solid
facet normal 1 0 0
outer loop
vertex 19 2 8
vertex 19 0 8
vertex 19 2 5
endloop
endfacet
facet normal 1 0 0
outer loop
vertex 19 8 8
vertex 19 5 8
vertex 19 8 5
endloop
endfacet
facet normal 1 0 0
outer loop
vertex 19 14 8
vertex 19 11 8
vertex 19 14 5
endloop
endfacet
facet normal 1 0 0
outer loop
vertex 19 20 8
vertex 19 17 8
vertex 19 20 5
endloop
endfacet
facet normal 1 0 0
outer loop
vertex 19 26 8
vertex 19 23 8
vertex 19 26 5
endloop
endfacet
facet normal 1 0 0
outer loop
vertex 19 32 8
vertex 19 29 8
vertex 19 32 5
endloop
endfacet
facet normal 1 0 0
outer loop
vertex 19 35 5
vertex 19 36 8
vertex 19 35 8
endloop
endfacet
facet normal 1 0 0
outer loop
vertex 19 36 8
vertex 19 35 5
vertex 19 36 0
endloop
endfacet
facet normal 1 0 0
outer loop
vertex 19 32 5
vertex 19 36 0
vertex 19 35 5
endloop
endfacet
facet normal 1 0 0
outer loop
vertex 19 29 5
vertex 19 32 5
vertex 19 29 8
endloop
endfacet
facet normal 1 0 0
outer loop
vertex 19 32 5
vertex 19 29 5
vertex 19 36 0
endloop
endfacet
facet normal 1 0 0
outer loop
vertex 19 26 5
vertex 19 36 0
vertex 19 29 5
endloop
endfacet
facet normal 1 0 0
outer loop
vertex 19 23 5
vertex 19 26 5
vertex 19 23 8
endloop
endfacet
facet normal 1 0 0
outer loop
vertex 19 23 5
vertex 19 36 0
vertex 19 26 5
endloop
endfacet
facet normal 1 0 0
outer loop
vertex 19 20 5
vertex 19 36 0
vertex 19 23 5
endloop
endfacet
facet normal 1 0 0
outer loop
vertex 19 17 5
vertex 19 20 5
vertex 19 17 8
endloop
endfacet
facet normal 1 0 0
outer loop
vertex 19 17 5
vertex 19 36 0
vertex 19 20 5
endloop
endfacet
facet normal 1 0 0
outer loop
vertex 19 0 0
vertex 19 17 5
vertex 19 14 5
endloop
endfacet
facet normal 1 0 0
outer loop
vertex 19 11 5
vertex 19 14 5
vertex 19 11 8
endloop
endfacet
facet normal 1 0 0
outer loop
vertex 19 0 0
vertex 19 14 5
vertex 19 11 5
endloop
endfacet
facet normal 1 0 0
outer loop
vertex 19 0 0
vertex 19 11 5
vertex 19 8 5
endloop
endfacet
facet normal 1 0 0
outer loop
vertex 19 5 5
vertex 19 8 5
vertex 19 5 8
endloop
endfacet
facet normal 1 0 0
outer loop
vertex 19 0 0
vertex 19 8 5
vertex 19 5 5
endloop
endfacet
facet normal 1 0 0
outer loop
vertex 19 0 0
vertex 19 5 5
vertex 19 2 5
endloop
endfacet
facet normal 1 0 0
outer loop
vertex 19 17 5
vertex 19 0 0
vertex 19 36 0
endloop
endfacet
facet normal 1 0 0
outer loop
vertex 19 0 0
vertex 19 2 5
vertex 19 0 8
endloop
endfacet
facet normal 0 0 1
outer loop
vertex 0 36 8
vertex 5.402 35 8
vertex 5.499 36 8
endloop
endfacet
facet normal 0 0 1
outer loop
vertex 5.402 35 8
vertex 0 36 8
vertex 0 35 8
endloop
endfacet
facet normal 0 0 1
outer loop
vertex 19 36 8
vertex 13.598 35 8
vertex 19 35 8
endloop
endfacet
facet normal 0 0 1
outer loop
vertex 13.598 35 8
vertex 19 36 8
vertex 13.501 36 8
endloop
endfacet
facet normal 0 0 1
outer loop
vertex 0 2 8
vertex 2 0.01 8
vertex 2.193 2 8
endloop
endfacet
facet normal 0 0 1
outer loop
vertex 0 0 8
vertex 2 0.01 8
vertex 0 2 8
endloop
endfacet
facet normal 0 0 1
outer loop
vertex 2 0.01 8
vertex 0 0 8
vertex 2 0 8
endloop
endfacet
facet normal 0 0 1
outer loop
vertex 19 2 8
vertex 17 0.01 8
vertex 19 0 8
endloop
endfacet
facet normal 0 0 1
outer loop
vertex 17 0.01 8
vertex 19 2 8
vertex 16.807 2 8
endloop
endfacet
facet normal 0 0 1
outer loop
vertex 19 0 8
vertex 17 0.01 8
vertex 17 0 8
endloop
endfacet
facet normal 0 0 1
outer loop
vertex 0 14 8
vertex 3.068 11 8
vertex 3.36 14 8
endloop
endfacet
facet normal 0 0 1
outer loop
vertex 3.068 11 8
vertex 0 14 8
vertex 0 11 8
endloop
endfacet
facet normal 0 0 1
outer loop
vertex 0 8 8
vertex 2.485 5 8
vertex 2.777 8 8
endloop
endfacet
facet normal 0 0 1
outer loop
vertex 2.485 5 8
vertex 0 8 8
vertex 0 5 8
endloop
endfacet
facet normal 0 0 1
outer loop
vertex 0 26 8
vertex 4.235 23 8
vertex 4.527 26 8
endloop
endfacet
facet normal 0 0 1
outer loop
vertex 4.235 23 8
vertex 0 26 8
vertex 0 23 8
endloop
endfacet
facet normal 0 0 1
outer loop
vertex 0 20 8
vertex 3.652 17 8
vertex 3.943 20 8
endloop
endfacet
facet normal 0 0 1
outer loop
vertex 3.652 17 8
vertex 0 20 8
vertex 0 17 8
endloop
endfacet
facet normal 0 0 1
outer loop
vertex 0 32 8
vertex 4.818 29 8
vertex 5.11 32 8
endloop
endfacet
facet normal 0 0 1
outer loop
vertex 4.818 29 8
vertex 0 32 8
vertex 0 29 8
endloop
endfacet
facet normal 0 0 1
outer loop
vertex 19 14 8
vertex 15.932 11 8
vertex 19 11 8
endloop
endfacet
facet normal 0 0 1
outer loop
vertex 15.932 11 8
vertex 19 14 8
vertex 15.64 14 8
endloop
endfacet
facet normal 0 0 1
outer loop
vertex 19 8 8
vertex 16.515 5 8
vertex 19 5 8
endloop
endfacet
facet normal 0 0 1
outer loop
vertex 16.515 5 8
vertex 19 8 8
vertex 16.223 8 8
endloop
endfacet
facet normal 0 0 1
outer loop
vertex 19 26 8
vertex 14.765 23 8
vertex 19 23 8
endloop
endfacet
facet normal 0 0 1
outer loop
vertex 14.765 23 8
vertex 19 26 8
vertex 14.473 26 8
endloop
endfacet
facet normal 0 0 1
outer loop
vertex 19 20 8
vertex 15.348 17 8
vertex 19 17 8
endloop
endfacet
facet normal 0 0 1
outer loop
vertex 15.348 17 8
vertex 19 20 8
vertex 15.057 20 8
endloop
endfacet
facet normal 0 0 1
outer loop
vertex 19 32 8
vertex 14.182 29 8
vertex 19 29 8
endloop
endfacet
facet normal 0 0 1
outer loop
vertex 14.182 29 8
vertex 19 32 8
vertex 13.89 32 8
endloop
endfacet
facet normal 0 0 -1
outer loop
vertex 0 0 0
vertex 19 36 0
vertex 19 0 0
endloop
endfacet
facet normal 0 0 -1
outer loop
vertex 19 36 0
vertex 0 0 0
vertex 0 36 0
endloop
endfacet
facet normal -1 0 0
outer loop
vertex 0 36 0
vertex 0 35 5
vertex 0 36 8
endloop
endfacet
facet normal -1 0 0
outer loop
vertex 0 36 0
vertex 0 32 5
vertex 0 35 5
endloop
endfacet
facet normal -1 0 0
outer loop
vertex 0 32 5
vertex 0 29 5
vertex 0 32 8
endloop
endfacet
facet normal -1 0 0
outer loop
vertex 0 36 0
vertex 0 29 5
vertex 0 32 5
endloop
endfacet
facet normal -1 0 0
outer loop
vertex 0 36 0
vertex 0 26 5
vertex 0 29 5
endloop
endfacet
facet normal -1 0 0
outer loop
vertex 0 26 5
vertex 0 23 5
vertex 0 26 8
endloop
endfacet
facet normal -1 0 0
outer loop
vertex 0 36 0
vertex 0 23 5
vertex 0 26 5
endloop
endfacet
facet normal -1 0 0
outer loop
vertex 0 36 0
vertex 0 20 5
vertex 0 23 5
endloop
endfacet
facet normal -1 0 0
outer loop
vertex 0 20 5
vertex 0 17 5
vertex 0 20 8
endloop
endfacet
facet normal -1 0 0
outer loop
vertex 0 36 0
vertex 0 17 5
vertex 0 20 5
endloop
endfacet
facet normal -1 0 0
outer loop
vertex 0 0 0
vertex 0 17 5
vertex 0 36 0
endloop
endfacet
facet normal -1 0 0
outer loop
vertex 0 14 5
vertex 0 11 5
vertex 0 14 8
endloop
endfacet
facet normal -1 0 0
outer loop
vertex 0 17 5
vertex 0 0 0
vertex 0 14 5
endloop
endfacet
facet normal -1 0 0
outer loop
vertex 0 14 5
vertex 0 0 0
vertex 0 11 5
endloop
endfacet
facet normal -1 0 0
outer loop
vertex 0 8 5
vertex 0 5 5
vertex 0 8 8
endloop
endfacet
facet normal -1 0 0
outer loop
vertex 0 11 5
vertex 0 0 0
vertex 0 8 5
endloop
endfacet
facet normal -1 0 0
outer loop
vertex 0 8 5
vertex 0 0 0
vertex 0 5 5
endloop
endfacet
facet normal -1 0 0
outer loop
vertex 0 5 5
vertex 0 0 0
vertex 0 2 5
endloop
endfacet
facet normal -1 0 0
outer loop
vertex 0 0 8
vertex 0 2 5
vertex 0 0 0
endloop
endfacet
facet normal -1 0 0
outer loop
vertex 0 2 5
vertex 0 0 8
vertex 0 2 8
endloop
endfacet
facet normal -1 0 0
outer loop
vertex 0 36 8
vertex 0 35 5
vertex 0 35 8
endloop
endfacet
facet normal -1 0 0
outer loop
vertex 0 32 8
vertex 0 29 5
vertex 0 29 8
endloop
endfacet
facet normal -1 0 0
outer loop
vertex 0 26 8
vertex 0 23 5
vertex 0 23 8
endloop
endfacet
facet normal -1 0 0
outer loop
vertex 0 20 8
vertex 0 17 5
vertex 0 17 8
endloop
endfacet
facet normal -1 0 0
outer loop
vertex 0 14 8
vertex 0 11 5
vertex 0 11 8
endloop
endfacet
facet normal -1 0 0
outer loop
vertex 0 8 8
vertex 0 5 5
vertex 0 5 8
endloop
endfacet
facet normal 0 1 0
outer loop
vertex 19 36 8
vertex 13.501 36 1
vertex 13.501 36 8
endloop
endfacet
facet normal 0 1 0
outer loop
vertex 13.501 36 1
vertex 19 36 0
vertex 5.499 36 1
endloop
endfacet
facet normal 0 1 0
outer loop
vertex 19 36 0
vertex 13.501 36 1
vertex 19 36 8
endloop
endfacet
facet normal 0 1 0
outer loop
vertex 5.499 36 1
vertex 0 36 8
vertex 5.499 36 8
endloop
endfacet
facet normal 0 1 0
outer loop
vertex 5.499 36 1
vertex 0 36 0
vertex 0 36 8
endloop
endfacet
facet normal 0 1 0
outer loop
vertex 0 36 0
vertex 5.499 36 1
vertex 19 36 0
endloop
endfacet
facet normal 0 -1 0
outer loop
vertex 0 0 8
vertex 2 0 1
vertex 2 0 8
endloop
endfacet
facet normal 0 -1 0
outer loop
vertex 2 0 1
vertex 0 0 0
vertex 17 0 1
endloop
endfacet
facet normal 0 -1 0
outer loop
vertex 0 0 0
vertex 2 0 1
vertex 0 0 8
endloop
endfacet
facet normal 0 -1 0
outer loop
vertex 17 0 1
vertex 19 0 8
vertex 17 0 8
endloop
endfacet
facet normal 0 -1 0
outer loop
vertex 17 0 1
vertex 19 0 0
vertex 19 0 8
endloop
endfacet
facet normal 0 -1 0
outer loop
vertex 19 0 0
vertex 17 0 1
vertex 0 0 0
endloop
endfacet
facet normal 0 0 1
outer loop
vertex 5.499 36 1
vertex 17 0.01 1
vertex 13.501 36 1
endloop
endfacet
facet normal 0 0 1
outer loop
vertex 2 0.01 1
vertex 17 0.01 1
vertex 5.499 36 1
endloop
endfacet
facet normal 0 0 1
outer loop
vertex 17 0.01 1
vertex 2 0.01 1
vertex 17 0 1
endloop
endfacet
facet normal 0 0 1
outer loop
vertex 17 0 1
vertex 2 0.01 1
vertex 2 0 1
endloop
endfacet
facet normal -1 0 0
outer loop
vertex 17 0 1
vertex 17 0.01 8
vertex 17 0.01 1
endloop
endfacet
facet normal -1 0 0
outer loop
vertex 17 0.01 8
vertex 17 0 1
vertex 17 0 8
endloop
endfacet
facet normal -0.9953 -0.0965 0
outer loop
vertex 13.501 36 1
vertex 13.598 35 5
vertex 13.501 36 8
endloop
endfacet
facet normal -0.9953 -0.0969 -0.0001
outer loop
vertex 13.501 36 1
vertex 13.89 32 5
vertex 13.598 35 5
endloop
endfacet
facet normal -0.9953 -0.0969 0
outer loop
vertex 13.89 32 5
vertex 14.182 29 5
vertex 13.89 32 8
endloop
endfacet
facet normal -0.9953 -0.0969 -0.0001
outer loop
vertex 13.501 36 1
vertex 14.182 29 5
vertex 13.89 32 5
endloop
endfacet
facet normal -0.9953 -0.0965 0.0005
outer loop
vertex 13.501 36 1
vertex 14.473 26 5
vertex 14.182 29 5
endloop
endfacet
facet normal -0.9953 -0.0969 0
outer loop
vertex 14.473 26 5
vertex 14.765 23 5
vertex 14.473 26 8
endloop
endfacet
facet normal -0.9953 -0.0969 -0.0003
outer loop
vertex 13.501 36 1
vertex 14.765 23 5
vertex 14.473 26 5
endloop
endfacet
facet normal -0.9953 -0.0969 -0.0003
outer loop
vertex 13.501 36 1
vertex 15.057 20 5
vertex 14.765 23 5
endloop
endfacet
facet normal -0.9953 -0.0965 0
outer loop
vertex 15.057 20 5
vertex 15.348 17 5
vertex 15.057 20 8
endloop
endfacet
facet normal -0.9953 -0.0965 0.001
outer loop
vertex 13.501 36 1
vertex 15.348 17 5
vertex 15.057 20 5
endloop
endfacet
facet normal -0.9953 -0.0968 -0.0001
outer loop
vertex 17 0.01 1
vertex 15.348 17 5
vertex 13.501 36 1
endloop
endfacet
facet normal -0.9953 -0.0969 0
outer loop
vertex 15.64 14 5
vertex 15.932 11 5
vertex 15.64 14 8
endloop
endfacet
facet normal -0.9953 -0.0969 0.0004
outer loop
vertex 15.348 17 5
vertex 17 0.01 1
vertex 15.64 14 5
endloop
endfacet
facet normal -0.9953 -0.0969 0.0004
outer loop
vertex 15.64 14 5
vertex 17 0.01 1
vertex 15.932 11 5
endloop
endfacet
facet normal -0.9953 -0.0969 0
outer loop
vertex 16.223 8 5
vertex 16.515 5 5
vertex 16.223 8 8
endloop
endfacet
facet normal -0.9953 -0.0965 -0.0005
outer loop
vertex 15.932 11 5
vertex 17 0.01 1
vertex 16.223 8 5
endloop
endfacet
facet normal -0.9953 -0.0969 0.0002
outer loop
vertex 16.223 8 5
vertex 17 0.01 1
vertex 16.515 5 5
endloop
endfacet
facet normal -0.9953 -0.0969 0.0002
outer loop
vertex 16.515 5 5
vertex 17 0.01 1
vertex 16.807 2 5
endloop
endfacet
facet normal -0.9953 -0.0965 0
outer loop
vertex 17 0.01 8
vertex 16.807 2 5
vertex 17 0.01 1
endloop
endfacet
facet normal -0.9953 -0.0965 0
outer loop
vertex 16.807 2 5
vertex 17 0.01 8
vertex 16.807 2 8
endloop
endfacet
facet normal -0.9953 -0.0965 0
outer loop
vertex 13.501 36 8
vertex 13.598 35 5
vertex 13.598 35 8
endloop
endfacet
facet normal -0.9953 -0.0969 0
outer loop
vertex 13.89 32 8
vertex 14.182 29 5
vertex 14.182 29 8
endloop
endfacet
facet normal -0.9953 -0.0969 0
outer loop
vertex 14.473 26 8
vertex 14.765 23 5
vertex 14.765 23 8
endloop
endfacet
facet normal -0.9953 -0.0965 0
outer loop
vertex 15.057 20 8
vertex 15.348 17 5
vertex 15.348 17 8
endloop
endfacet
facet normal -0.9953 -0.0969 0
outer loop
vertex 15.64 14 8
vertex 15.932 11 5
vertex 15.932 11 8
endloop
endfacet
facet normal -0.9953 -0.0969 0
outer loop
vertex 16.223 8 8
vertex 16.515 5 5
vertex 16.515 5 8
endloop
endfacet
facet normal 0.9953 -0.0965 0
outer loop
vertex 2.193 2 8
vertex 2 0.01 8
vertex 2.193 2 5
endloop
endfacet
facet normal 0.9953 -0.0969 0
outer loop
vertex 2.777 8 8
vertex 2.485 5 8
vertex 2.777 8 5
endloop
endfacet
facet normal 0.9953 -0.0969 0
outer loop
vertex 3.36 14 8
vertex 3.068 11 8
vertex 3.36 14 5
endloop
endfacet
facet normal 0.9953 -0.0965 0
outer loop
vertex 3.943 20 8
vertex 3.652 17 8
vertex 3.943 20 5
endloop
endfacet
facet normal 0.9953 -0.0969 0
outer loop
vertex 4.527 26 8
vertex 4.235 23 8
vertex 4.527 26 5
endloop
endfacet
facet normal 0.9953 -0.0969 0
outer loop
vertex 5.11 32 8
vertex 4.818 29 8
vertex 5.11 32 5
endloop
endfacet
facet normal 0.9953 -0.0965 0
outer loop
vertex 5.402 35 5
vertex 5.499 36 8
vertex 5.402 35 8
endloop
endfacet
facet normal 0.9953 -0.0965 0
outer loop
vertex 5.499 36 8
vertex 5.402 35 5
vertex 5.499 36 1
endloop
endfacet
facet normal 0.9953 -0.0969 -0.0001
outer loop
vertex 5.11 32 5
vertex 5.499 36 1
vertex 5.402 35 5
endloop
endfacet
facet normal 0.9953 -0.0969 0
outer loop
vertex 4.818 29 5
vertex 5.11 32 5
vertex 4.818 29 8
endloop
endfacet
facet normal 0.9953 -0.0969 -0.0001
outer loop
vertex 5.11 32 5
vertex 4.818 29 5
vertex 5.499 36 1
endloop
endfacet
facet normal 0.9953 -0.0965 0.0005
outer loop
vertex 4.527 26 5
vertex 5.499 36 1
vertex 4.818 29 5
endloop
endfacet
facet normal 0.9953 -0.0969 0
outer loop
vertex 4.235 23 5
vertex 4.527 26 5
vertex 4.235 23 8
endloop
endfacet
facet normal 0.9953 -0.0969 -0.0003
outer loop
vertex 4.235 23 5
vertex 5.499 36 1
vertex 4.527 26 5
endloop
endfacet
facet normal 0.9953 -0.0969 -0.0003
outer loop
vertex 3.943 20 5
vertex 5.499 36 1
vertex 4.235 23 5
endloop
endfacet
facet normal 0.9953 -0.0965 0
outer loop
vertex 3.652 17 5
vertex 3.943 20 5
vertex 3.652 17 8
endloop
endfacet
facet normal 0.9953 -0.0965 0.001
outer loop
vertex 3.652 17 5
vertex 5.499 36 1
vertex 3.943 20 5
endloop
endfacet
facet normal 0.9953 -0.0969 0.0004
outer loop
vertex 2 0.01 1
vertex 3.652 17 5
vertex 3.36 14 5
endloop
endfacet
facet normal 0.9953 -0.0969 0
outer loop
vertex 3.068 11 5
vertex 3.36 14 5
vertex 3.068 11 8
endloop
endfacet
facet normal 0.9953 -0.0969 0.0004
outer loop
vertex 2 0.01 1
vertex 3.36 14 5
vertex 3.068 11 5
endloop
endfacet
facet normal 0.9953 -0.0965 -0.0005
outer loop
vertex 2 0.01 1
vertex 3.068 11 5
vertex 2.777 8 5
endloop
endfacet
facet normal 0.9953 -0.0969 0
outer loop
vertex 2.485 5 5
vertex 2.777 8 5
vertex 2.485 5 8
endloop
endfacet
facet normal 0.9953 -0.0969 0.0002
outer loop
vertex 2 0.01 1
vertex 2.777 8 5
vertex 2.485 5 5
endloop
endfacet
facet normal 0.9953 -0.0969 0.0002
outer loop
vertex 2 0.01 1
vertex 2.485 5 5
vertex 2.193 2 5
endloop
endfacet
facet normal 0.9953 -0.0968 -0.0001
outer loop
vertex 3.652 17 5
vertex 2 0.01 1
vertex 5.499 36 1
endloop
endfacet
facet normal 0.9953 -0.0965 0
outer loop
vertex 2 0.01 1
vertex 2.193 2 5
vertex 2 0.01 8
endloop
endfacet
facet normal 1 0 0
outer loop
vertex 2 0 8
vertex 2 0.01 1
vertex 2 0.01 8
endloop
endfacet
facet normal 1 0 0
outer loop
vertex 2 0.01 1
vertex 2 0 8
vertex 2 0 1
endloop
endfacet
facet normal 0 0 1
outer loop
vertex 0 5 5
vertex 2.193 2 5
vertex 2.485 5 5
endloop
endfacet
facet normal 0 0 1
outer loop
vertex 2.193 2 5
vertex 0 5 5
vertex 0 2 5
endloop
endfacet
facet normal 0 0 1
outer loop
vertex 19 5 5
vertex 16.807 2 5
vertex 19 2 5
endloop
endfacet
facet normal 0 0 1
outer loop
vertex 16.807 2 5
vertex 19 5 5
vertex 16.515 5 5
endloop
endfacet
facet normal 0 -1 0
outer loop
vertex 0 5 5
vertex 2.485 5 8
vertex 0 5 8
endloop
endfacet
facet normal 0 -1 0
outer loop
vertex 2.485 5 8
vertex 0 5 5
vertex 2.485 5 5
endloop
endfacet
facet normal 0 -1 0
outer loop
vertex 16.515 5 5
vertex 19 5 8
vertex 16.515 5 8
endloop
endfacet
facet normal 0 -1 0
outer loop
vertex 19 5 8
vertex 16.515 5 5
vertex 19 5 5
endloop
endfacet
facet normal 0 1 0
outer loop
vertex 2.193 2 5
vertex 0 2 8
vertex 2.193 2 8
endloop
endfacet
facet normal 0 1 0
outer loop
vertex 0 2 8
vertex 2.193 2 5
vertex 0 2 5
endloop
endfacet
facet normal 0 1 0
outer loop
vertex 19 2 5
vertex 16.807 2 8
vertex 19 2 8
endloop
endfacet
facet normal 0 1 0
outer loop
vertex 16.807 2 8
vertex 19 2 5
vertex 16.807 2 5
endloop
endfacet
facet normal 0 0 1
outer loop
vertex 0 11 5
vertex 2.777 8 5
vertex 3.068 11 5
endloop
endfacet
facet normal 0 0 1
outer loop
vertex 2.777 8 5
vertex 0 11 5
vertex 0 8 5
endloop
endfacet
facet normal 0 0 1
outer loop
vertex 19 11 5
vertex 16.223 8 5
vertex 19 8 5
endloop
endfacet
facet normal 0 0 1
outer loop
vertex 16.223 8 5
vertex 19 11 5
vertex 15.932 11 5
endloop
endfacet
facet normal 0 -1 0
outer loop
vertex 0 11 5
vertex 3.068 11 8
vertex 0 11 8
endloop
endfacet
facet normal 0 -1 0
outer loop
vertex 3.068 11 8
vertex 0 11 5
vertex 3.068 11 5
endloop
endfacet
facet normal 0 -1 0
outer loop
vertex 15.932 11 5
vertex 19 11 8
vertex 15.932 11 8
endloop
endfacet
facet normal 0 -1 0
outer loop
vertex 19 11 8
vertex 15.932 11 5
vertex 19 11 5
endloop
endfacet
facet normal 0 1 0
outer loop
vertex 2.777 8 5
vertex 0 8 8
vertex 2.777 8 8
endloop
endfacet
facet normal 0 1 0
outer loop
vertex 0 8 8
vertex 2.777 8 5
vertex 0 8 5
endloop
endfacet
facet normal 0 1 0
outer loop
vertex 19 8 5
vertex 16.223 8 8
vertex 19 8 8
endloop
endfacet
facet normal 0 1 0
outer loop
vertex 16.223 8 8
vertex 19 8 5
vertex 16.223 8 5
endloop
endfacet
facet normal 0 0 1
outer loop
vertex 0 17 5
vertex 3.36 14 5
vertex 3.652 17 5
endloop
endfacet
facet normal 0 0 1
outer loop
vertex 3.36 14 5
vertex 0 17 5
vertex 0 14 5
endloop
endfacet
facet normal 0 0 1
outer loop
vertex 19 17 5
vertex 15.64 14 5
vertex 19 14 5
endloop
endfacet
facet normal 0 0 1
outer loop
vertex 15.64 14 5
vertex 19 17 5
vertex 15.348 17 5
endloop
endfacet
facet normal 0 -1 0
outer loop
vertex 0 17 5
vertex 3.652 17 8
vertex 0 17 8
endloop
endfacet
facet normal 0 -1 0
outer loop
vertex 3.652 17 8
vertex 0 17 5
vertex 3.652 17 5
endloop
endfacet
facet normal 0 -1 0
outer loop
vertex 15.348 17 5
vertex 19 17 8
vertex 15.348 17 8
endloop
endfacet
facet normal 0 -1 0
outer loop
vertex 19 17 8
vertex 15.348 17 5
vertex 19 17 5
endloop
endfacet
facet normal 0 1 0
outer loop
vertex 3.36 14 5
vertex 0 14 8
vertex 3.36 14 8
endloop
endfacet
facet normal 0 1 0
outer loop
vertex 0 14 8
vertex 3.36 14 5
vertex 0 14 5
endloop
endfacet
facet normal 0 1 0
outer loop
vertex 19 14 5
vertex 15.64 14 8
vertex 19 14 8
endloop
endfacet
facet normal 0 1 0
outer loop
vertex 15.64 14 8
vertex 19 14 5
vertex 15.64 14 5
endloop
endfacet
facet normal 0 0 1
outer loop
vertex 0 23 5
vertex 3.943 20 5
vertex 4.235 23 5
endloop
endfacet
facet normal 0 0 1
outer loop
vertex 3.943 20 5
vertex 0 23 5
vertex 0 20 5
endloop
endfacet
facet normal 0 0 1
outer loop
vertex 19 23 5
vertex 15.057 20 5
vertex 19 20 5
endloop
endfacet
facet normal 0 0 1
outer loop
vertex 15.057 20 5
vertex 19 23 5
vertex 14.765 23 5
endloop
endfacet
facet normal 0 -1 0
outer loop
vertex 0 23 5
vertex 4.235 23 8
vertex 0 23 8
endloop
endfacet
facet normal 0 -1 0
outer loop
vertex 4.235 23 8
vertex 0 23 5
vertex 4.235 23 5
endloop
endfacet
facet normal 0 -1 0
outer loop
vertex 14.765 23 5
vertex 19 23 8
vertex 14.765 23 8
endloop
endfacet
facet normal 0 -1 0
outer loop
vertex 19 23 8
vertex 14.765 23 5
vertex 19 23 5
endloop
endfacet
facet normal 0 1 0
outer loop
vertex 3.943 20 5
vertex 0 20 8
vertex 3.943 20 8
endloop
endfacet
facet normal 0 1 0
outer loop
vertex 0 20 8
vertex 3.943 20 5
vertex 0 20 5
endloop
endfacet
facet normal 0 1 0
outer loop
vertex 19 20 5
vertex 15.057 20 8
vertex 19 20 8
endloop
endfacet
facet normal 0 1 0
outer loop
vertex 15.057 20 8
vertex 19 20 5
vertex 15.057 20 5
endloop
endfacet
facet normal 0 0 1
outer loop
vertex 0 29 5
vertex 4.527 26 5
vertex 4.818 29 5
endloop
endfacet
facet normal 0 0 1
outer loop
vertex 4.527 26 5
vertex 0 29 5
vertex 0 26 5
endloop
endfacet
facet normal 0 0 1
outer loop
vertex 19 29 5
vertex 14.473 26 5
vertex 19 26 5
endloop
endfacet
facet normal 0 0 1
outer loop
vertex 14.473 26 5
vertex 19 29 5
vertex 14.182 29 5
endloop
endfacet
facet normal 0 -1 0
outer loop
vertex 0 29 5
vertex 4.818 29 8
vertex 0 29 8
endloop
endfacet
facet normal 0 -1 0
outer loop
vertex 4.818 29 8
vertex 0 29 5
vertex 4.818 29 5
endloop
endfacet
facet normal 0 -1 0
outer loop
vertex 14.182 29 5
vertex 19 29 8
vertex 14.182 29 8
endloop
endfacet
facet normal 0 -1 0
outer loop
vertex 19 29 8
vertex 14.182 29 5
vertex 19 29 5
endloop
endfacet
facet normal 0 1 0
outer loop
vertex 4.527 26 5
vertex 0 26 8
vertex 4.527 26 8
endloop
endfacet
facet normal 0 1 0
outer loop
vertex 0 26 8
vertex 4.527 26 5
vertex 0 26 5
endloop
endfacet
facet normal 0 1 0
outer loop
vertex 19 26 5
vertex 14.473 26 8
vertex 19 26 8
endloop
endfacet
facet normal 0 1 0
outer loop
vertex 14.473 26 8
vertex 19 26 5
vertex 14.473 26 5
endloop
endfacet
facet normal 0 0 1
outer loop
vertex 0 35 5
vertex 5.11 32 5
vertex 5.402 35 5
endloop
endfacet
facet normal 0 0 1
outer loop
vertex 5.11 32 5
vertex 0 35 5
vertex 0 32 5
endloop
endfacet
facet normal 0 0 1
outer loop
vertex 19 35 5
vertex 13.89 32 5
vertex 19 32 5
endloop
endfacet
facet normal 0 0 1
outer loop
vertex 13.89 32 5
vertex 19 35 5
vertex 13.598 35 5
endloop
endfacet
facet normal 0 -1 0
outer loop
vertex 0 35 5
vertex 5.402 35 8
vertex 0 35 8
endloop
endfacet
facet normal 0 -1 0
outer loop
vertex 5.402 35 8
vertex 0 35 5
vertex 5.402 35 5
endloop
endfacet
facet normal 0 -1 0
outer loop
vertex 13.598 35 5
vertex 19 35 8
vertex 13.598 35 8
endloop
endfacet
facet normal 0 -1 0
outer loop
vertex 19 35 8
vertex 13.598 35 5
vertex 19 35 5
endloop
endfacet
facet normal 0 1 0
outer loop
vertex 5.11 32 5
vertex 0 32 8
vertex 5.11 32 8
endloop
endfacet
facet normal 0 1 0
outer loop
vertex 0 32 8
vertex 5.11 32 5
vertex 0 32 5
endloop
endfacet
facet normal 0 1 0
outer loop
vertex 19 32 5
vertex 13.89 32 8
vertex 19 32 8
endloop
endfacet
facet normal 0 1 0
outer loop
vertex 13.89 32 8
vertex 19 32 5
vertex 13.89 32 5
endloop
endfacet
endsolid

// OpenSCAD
//!OpenSCAD
//Number of bending slots
Numer_of_slots = 6;
//bending slot width in mm
slot_width = 3;
//bending slot height in mm
Slot_height = 3;
// biggest distance between the bending slots in mm (the total bending width is the biggest distance + 4mm)
Biggest_distance = 15;
//height of the cutout in the middle in mm
cutout_height = 7;
// smallest distance between the bending slots in mm
Smallest_distance = 8;
difference() {
  difference() {
    cube([(Biggest_distance + 4), (Numer_of_slots * (slot_width * 2)), ((Slot_height + 5) + 0)], center=false);

    rotate([270, 0, 0]){
      translate([((Biggest_distance + 4) / 2 - Biggest_distance / 2), ((Slot_height + 5) * -1), 0]){
        hull(){
          cube([Biggest_distance, cutout_height, 0.01], center=false);
          translate([((Biggest_distance - Smallest_distance) / 2), 0, (Numer_of_slots * (slot_width * 2))]){
            cube([Smallest_distance, cutout_height, 0.01], center=false);
          }
        }
      }
    }
  }

  for (i = [1 : abs(slot_width) : Numer_of_slots * (slot_width * 1)]) {
    translate([0, (i * 2), 5]){
      cube([100, slot_width, Slot_height], center=false);
    }
  }

}
//cutout_height;
